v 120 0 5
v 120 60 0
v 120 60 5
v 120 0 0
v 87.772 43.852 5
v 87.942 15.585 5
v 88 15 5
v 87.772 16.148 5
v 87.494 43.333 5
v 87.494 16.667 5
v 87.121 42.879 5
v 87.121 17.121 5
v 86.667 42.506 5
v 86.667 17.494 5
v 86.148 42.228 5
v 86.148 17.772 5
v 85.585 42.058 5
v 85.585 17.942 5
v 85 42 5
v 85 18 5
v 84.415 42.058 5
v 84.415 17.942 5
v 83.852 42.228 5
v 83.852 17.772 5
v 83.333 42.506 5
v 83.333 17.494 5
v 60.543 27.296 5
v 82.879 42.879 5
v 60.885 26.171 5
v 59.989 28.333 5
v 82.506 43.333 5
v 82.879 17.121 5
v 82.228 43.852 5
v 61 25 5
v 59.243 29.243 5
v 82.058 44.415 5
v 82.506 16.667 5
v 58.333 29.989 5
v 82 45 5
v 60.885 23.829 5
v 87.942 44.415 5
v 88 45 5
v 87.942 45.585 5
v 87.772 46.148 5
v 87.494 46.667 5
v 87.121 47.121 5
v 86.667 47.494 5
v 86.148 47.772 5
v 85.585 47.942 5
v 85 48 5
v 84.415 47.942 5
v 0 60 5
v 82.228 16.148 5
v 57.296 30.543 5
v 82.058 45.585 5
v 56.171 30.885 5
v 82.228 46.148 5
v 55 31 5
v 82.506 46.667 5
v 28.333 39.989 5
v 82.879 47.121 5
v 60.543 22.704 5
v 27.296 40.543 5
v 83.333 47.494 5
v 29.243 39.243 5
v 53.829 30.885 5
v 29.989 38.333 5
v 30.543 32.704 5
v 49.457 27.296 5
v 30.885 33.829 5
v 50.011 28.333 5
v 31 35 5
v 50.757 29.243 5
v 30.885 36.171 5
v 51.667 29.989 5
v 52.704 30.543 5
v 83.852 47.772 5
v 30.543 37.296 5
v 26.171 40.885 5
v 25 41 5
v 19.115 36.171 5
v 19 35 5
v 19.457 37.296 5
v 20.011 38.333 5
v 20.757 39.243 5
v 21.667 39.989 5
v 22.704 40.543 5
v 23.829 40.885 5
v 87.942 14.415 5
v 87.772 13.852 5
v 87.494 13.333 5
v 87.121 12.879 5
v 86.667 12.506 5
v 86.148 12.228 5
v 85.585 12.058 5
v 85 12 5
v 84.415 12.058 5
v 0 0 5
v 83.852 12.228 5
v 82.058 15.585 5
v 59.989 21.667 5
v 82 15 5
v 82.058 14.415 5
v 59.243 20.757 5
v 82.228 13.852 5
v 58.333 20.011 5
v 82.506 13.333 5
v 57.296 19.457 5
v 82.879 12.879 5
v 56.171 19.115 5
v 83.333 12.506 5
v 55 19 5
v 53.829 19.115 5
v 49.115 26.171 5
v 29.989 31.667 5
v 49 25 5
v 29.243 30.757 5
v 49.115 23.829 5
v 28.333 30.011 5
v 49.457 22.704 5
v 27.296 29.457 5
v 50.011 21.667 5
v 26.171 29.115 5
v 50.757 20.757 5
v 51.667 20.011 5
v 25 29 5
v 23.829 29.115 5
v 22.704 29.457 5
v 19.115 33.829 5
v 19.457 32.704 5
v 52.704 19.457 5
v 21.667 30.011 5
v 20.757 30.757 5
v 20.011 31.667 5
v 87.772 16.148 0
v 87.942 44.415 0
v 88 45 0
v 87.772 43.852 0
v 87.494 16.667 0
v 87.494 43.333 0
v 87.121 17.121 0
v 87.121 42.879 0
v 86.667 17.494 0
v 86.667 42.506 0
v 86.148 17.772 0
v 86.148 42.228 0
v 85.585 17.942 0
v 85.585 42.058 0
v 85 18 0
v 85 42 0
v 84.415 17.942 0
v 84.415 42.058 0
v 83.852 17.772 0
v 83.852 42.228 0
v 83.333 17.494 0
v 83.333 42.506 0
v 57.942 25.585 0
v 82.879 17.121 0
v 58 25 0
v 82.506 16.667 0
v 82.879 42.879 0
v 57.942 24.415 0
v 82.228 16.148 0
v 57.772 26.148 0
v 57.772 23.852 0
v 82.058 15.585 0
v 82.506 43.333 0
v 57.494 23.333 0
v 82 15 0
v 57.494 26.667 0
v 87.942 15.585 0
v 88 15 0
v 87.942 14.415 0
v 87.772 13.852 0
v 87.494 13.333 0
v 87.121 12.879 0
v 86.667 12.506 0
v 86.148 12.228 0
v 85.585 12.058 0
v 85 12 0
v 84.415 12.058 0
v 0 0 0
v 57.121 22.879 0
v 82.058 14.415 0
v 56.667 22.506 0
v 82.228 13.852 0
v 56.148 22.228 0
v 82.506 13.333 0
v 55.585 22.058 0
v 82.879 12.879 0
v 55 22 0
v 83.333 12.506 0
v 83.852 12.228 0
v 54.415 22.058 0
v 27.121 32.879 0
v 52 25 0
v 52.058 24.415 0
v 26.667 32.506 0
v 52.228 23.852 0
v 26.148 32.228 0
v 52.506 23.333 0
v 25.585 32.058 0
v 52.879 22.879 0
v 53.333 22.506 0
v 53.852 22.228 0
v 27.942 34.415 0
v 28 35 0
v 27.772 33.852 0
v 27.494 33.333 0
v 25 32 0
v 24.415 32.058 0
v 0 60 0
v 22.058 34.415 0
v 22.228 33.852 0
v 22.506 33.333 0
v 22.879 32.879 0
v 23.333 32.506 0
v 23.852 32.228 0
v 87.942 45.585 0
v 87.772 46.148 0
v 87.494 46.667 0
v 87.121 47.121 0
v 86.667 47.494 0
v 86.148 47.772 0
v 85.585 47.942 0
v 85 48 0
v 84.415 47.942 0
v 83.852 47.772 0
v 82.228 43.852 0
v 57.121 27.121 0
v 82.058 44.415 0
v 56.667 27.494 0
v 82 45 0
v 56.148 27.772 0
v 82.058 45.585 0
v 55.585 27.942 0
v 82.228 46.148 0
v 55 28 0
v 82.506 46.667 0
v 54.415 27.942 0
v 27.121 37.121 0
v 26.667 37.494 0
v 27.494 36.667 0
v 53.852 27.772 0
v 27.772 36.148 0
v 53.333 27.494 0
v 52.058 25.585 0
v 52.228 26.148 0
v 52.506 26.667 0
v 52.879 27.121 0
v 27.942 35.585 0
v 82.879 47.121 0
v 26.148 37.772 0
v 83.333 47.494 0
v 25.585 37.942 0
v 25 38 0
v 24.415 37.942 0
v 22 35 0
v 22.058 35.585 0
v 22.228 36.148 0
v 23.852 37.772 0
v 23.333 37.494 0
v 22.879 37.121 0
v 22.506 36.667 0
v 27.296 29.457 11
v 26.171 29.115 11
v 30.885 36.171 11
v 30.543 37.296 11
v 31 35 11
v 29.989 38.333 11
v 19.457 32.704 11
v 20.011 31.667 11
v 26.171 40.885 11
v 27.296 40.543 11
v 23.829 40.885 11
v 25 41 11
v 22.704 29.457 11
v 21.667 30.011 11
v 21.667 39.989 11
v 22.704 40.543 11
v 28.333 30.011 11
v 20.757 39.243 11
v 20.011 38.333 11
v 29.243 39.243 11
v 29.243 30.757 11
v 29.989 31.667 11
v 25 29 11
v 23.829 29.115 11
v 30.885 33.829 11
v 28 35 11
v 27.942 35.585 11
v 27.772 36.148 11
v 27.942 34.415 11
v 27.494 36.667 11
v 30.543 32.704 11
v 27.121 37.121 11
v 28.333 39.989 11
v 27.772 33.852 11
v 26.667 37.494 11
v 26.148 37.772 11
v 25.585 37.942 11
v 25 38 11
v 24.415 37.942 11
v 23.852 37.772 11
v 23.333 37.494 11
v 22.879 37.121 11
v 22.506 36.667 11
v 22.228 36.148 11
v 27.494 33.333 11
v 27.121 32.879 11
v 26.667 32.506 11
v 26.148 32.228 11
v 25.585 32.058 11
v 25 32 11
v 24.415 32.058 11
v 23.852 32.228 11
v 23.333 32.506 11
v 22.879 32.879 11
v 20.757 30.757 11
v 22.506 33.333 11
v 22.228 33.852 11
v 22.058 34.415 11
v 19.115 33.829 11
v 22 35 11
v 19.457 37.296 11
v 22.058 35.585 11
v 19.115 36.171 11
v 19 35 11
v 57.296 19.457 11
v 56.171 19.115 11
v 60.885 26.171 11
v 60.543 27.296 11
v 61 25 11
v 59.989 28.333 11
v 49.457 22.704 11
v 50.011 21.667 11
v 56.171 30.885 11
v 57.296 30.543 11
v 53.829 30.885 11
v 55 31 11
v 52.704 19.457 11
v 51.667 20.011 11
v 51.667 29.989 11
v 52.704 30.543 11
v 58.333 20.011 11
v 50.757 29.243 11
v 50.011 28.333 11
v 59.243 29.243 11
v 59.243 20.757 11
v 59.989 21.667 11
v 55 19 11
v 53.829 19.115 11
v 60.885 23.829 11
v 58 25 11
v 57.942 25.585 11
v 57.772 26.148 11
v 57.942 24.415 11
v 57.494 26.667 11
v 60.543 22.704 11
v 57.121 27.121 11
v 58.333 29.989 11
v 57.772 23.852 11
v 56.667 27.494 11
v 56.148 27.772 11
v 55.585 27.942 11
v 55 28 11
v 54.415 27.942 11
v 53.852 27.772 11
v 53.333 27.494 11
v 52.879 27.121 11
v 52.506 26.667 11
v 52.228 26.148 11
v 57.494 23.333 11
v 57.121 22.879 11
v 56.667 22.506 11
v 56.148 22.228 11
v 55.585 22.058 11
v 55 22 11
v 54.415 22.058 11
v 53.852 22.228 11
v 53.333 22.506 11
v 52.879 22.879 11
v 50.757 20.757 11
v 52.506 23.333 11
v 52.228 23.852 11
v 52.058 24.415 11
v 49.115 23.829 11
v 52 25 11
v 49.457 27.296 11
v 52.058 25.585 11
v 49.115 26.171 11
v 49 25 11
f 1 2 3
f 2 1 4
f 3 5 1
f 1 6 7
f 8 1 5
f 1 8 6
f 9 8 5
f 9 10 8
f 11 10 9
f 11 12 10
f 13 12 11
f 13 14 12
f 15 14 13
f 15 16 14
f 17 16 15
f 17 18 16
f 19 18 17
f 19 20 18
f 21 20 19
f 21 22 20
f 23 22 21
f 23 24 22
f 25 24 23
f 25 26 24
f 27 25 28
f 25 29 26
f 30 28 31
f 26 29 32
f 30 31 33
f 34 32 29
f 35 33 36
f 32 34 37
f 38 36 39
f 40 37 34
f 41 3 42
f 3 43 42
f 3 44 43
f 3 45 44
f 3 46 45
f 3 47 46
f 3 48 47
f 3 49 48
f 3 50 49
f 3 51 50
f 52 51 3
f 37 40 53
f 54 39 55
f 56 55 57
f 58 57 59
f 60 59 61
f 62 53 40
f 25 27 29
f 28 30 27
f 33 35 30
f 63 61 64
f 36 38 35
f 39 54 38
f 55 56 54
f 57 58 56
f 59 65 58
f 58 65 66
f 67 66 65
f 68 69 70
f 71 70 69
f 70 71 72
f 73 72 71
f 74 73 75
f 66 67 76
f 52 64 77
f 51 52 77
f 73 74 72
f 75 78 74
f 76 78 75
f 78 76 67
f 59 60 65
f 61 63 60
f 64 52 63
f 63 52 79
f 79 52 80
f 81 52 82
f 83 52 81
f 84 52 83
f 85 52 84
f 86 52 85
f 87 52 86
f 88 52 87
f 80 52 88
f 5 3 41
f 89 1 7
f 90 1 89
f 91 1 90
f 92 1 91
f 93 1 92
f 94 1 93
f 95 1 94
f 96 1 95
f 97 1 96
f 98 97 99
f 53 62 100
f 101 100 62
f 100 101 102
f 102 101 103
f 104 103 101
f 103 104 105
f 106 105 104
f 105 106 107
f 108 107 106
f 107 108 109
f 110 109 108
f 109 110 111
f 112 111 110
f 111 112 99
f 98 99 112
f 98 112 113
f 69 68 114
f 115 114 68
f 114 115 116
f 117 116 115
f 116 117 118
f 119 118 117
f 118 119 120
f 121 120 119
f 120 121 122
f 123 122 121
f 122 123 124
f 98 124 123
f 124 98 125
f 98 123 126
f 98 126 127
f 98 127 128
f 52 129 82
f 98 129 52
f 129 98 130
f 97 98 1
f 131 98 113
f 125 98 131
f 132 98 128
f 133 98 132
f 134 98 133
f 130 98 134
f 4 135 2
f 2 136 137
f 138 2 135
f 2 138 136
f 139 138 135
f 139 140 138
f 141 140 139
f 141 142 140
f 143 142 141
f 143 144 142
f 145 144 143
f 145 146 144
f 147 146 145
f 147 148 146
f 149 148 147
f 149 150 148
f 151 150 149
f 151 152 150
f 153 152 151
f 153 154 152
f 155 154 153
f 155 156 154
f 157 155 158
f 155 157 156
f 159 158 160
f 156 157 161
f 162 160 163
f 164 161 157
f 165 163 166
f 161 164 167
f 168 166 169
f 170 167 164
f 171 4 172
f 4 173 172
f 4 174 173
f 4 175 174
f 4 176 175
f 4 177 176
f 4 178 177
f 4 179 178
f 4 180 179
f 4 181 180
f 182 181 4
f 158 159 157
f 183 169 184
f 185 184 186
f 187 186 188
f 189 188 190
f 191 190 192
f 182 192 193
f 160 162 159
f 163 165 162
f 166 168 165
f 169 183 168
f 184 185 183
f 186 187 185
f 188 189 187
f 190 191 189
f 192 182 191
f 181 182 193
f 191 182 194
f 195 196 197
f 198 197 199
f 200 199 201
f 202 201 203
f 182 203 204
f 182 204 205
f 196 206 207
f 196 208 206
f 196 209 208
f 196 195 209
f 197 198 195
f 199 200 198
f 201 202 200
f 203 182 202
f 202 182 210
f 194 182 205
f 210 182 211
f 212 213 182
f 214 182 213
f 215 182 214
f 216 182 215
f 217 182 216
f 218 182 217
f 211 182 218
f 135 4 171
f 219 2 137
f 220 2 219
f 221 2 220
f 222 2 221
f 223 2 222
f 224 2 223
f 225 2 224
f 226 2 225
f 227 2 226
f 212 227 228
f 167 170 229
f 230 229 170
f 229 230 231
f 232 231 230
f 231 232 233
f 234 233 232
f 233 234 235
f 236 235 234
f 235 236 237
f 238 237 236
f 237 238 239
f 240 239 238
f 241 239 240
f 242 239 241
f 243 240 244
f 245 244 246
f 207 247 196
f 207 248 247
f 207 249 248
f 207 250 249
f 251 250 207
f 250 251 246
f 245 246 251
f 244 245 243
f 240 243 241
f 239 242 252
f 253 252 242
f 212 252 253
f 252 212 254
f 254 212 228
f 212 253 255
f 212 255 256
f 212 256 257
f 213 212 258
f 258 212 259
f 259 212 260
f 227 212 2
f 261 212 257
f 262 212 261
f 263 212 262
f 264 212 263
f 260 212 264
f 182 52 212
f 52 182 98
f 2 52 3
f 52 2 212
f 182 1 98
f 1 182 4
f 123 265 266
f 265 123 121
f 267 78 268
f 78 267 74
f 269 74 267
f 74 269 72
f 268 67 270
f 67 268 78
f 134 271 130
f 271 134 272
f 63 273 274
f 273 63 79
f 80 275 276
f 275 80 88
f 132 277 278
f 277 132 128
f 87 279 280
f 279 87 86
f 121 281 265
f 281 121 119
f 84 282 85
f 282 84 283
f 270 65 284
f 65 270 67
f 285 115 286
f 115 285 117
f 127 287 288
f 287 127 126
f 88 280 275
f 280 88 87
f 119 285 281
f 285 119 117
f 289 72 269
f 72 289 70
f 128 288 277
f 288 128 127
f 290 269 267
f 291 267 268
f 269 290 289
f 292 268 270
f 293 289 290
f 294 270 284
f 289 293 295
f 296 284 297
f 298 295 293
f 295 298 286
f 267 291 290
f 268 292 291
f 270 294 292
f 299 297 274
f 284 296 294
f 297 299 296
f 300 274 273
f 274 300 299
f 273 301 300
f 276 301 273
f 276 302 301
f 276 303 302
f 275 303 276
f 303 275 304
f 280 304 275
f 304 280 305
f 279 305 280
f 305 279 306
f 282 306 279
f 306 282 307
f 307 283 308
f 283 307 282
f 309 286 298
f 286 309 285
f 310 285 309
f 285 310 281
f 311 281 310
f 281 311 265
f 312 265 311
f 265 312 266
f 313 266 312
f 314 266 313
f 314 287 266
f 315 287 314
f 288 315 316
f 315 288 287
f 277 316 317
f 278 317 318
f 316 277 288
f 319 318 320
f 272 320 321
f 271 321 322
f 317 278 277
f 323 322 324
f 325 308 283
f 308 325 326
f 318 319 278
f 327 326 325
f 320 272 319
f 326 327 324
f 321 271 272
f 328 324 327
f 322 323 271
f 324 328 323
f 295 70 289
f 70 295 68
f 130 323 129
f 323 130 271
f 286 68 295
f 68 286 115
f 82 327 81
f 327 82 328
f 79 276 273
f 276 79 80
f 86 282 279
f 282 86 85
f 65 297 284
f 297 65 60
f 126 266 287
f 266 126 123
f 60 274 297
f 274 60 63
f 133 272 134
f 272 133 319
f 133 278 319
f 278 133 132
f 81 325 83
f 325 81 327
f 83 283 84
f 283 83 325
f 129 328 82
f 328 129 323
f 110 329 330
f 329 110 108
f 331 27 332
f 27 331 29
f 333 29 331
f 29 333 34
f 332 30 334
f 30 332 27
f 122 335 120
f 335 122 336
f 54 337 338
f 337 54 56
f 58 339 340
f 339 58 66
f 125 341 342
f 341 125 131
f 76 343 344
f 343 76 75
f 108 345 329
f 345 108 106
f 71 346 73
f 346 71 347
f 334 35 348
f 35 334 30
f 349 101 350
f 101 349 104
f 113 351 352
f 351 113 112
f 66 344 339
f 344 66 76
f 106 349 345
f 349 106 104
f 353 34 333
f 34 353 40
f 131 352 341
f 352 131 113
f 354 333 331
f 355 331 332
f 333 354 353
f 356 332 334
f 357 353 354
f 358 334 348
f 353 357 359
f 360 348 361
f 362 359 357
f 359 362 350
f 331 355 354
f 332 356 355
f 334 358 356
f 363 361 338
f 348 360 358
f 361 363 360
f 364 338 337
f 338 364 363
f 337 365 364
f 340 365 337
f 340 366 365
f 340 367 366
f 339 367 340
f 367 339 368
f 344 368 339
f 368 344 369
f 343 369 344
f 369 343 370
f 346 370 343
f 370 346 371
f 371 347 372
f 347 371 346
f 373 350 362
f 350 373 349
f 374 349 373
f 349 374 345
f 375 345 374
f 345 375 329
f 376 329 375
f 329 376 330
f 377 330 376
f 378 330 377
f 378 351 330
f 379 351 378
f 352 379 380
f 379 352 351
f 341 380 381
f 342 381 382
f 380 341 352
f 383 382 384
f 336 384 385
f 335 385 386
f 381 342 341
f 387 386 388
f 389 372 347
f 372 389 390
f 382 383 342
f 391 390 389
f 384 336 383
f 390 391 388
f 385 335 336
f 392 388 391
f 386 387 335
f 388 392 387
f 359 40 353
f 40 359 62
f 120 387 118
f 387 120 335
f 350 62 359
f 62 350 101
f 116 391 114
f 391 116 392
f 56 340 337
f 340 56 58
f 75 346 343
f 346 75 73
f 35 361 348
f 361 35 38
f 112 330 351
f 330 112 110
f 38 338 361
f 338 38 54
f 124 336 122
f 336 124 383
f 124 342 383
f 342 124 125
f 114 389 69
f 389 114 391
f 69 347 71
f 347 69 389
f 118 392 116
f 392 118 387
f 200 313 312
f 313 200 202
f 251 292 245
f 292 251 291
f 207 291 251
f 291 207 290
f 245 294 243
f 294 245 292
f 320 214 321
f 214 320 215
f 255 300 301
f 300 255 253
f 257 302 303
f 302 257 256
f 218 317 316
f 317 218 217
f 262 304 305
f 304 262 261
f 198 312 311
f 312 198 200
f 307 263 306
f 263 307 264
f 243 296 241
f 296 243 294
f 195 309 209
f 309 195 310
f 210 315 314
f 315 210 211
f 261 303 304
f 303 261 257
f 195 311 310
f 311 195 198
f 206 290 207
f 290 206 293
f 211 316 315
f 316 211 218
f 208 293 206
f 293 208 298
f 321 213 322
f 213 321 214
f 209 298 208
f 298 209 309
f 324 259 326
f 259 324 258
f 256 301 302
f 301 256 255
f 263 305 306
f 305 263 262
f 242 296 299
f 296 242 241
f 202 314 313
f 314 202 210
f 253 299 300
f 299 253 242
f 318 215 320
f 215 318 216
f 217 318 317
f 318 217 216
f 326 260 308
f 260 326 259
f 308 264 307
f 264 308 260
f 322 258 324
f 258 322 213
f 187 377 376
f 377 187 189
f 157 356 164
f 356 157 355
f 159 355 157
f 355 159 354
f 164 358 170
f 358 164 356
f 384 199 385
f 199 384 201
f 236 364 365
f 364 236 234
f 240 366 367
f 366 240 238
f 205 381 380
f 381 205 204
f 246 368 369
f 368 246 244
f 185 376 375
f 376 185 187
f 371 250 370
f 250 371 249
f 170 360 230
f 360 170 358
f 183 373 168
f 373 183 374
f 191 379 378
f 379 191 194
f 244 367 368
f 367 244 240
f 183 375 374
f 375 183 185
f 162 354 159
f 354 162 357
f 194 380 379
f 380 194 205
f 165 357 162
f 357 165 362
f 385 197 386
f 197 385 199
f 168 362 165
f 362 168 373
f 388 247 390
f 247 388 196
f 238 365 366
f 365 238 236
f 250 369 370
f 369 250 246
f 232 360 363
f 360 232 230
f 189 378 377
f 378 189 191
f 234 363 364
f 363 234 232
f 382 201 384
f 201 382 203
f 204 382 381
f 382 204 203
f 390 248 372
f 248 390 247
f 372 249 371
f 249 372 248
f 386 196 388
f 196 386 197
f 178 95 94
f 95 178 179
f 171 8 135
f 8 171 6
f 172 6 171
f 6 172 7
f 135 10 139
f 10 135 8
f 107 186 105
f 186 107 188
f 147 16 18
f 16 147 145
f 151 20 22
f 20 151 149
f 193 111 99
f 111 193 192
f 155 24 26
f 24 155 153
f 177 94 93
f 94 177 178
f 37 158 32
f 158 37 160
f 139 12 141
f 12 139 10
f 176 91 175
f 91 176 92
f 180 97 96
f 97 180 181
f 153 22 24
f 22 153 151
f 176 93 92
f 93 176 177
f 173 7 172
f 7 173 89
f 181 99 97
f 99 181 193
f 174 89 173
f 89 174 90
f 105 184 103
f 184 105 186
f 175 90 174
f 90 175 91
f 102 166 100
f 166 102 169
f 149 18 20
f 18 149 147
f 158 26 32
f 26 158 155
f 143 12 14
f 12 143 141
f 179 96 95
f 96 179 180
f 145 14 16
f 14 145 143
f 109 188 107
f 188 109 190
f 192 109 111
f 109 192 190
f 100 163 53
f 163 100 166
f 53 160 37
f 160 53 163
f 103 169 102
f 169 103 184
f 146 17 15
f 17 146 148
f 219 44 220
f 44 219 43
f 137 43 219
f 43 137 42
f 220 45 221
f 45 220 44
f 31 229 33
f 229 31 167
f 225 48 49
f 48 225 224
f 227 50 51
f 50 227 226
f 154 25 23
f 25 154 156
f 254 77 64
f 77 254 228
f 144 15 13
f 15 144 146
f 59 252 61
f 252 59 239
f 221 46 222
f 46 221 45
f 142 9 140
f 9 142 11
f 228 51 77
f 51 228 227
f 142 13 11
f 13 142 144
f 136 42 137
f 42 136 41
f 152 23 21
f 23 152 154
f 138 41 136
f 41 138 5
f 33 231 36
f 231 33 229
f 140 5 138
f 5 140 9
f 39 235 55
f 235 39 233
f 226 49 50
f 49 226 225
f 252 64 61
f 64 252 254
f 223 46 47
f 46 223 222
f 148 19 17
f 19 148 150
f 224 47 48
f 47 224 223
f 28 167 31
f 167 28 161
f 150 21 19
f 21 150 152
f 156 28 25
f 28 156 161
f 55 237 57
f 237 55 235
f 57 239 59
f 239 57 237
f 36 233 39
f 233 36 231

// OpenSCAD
$fn = 32;

// ----------------------------------------------------------------------
// Mixed field: bosses and holes at given coordinates
// ----------------------------------------------------------------------

// --- parameters (mm) ---
plate_l = 120;            // plate length, X
plate_w = 60;             // plate width, Y
plate_t = 5;              // plate thickness, Z
boss_d = 12;              // boss diameter
boss_h = 6;               // boss height above the plate
hole_d = 6;               // through hole diameter

total_h = plate_t + boss_h;  // overall height

difference() {
  union() {
    cube([plate_l, plate_w, plate_t]);
    translate([25, 35, plate_t]) cylinder(h = boss_h, d = boss_d);
    translate([55, 25, plate_t]) cylinder(h = boss_h, d = boss_d);
  }
  translate([25, 35, -1]) cylinder(h = total_h + 2, d = boss_d / 2);
  translate([55, 25, -1]) cylinder(h = total_h + 2, d = boss_d / 2);
  translate([85, 15, -1]) cylinder(h = plate_t + 2, d = hole_d);
  translate([85, 45, -1]) cylinder(h = plate_t + 2, d = hole_d);
}
